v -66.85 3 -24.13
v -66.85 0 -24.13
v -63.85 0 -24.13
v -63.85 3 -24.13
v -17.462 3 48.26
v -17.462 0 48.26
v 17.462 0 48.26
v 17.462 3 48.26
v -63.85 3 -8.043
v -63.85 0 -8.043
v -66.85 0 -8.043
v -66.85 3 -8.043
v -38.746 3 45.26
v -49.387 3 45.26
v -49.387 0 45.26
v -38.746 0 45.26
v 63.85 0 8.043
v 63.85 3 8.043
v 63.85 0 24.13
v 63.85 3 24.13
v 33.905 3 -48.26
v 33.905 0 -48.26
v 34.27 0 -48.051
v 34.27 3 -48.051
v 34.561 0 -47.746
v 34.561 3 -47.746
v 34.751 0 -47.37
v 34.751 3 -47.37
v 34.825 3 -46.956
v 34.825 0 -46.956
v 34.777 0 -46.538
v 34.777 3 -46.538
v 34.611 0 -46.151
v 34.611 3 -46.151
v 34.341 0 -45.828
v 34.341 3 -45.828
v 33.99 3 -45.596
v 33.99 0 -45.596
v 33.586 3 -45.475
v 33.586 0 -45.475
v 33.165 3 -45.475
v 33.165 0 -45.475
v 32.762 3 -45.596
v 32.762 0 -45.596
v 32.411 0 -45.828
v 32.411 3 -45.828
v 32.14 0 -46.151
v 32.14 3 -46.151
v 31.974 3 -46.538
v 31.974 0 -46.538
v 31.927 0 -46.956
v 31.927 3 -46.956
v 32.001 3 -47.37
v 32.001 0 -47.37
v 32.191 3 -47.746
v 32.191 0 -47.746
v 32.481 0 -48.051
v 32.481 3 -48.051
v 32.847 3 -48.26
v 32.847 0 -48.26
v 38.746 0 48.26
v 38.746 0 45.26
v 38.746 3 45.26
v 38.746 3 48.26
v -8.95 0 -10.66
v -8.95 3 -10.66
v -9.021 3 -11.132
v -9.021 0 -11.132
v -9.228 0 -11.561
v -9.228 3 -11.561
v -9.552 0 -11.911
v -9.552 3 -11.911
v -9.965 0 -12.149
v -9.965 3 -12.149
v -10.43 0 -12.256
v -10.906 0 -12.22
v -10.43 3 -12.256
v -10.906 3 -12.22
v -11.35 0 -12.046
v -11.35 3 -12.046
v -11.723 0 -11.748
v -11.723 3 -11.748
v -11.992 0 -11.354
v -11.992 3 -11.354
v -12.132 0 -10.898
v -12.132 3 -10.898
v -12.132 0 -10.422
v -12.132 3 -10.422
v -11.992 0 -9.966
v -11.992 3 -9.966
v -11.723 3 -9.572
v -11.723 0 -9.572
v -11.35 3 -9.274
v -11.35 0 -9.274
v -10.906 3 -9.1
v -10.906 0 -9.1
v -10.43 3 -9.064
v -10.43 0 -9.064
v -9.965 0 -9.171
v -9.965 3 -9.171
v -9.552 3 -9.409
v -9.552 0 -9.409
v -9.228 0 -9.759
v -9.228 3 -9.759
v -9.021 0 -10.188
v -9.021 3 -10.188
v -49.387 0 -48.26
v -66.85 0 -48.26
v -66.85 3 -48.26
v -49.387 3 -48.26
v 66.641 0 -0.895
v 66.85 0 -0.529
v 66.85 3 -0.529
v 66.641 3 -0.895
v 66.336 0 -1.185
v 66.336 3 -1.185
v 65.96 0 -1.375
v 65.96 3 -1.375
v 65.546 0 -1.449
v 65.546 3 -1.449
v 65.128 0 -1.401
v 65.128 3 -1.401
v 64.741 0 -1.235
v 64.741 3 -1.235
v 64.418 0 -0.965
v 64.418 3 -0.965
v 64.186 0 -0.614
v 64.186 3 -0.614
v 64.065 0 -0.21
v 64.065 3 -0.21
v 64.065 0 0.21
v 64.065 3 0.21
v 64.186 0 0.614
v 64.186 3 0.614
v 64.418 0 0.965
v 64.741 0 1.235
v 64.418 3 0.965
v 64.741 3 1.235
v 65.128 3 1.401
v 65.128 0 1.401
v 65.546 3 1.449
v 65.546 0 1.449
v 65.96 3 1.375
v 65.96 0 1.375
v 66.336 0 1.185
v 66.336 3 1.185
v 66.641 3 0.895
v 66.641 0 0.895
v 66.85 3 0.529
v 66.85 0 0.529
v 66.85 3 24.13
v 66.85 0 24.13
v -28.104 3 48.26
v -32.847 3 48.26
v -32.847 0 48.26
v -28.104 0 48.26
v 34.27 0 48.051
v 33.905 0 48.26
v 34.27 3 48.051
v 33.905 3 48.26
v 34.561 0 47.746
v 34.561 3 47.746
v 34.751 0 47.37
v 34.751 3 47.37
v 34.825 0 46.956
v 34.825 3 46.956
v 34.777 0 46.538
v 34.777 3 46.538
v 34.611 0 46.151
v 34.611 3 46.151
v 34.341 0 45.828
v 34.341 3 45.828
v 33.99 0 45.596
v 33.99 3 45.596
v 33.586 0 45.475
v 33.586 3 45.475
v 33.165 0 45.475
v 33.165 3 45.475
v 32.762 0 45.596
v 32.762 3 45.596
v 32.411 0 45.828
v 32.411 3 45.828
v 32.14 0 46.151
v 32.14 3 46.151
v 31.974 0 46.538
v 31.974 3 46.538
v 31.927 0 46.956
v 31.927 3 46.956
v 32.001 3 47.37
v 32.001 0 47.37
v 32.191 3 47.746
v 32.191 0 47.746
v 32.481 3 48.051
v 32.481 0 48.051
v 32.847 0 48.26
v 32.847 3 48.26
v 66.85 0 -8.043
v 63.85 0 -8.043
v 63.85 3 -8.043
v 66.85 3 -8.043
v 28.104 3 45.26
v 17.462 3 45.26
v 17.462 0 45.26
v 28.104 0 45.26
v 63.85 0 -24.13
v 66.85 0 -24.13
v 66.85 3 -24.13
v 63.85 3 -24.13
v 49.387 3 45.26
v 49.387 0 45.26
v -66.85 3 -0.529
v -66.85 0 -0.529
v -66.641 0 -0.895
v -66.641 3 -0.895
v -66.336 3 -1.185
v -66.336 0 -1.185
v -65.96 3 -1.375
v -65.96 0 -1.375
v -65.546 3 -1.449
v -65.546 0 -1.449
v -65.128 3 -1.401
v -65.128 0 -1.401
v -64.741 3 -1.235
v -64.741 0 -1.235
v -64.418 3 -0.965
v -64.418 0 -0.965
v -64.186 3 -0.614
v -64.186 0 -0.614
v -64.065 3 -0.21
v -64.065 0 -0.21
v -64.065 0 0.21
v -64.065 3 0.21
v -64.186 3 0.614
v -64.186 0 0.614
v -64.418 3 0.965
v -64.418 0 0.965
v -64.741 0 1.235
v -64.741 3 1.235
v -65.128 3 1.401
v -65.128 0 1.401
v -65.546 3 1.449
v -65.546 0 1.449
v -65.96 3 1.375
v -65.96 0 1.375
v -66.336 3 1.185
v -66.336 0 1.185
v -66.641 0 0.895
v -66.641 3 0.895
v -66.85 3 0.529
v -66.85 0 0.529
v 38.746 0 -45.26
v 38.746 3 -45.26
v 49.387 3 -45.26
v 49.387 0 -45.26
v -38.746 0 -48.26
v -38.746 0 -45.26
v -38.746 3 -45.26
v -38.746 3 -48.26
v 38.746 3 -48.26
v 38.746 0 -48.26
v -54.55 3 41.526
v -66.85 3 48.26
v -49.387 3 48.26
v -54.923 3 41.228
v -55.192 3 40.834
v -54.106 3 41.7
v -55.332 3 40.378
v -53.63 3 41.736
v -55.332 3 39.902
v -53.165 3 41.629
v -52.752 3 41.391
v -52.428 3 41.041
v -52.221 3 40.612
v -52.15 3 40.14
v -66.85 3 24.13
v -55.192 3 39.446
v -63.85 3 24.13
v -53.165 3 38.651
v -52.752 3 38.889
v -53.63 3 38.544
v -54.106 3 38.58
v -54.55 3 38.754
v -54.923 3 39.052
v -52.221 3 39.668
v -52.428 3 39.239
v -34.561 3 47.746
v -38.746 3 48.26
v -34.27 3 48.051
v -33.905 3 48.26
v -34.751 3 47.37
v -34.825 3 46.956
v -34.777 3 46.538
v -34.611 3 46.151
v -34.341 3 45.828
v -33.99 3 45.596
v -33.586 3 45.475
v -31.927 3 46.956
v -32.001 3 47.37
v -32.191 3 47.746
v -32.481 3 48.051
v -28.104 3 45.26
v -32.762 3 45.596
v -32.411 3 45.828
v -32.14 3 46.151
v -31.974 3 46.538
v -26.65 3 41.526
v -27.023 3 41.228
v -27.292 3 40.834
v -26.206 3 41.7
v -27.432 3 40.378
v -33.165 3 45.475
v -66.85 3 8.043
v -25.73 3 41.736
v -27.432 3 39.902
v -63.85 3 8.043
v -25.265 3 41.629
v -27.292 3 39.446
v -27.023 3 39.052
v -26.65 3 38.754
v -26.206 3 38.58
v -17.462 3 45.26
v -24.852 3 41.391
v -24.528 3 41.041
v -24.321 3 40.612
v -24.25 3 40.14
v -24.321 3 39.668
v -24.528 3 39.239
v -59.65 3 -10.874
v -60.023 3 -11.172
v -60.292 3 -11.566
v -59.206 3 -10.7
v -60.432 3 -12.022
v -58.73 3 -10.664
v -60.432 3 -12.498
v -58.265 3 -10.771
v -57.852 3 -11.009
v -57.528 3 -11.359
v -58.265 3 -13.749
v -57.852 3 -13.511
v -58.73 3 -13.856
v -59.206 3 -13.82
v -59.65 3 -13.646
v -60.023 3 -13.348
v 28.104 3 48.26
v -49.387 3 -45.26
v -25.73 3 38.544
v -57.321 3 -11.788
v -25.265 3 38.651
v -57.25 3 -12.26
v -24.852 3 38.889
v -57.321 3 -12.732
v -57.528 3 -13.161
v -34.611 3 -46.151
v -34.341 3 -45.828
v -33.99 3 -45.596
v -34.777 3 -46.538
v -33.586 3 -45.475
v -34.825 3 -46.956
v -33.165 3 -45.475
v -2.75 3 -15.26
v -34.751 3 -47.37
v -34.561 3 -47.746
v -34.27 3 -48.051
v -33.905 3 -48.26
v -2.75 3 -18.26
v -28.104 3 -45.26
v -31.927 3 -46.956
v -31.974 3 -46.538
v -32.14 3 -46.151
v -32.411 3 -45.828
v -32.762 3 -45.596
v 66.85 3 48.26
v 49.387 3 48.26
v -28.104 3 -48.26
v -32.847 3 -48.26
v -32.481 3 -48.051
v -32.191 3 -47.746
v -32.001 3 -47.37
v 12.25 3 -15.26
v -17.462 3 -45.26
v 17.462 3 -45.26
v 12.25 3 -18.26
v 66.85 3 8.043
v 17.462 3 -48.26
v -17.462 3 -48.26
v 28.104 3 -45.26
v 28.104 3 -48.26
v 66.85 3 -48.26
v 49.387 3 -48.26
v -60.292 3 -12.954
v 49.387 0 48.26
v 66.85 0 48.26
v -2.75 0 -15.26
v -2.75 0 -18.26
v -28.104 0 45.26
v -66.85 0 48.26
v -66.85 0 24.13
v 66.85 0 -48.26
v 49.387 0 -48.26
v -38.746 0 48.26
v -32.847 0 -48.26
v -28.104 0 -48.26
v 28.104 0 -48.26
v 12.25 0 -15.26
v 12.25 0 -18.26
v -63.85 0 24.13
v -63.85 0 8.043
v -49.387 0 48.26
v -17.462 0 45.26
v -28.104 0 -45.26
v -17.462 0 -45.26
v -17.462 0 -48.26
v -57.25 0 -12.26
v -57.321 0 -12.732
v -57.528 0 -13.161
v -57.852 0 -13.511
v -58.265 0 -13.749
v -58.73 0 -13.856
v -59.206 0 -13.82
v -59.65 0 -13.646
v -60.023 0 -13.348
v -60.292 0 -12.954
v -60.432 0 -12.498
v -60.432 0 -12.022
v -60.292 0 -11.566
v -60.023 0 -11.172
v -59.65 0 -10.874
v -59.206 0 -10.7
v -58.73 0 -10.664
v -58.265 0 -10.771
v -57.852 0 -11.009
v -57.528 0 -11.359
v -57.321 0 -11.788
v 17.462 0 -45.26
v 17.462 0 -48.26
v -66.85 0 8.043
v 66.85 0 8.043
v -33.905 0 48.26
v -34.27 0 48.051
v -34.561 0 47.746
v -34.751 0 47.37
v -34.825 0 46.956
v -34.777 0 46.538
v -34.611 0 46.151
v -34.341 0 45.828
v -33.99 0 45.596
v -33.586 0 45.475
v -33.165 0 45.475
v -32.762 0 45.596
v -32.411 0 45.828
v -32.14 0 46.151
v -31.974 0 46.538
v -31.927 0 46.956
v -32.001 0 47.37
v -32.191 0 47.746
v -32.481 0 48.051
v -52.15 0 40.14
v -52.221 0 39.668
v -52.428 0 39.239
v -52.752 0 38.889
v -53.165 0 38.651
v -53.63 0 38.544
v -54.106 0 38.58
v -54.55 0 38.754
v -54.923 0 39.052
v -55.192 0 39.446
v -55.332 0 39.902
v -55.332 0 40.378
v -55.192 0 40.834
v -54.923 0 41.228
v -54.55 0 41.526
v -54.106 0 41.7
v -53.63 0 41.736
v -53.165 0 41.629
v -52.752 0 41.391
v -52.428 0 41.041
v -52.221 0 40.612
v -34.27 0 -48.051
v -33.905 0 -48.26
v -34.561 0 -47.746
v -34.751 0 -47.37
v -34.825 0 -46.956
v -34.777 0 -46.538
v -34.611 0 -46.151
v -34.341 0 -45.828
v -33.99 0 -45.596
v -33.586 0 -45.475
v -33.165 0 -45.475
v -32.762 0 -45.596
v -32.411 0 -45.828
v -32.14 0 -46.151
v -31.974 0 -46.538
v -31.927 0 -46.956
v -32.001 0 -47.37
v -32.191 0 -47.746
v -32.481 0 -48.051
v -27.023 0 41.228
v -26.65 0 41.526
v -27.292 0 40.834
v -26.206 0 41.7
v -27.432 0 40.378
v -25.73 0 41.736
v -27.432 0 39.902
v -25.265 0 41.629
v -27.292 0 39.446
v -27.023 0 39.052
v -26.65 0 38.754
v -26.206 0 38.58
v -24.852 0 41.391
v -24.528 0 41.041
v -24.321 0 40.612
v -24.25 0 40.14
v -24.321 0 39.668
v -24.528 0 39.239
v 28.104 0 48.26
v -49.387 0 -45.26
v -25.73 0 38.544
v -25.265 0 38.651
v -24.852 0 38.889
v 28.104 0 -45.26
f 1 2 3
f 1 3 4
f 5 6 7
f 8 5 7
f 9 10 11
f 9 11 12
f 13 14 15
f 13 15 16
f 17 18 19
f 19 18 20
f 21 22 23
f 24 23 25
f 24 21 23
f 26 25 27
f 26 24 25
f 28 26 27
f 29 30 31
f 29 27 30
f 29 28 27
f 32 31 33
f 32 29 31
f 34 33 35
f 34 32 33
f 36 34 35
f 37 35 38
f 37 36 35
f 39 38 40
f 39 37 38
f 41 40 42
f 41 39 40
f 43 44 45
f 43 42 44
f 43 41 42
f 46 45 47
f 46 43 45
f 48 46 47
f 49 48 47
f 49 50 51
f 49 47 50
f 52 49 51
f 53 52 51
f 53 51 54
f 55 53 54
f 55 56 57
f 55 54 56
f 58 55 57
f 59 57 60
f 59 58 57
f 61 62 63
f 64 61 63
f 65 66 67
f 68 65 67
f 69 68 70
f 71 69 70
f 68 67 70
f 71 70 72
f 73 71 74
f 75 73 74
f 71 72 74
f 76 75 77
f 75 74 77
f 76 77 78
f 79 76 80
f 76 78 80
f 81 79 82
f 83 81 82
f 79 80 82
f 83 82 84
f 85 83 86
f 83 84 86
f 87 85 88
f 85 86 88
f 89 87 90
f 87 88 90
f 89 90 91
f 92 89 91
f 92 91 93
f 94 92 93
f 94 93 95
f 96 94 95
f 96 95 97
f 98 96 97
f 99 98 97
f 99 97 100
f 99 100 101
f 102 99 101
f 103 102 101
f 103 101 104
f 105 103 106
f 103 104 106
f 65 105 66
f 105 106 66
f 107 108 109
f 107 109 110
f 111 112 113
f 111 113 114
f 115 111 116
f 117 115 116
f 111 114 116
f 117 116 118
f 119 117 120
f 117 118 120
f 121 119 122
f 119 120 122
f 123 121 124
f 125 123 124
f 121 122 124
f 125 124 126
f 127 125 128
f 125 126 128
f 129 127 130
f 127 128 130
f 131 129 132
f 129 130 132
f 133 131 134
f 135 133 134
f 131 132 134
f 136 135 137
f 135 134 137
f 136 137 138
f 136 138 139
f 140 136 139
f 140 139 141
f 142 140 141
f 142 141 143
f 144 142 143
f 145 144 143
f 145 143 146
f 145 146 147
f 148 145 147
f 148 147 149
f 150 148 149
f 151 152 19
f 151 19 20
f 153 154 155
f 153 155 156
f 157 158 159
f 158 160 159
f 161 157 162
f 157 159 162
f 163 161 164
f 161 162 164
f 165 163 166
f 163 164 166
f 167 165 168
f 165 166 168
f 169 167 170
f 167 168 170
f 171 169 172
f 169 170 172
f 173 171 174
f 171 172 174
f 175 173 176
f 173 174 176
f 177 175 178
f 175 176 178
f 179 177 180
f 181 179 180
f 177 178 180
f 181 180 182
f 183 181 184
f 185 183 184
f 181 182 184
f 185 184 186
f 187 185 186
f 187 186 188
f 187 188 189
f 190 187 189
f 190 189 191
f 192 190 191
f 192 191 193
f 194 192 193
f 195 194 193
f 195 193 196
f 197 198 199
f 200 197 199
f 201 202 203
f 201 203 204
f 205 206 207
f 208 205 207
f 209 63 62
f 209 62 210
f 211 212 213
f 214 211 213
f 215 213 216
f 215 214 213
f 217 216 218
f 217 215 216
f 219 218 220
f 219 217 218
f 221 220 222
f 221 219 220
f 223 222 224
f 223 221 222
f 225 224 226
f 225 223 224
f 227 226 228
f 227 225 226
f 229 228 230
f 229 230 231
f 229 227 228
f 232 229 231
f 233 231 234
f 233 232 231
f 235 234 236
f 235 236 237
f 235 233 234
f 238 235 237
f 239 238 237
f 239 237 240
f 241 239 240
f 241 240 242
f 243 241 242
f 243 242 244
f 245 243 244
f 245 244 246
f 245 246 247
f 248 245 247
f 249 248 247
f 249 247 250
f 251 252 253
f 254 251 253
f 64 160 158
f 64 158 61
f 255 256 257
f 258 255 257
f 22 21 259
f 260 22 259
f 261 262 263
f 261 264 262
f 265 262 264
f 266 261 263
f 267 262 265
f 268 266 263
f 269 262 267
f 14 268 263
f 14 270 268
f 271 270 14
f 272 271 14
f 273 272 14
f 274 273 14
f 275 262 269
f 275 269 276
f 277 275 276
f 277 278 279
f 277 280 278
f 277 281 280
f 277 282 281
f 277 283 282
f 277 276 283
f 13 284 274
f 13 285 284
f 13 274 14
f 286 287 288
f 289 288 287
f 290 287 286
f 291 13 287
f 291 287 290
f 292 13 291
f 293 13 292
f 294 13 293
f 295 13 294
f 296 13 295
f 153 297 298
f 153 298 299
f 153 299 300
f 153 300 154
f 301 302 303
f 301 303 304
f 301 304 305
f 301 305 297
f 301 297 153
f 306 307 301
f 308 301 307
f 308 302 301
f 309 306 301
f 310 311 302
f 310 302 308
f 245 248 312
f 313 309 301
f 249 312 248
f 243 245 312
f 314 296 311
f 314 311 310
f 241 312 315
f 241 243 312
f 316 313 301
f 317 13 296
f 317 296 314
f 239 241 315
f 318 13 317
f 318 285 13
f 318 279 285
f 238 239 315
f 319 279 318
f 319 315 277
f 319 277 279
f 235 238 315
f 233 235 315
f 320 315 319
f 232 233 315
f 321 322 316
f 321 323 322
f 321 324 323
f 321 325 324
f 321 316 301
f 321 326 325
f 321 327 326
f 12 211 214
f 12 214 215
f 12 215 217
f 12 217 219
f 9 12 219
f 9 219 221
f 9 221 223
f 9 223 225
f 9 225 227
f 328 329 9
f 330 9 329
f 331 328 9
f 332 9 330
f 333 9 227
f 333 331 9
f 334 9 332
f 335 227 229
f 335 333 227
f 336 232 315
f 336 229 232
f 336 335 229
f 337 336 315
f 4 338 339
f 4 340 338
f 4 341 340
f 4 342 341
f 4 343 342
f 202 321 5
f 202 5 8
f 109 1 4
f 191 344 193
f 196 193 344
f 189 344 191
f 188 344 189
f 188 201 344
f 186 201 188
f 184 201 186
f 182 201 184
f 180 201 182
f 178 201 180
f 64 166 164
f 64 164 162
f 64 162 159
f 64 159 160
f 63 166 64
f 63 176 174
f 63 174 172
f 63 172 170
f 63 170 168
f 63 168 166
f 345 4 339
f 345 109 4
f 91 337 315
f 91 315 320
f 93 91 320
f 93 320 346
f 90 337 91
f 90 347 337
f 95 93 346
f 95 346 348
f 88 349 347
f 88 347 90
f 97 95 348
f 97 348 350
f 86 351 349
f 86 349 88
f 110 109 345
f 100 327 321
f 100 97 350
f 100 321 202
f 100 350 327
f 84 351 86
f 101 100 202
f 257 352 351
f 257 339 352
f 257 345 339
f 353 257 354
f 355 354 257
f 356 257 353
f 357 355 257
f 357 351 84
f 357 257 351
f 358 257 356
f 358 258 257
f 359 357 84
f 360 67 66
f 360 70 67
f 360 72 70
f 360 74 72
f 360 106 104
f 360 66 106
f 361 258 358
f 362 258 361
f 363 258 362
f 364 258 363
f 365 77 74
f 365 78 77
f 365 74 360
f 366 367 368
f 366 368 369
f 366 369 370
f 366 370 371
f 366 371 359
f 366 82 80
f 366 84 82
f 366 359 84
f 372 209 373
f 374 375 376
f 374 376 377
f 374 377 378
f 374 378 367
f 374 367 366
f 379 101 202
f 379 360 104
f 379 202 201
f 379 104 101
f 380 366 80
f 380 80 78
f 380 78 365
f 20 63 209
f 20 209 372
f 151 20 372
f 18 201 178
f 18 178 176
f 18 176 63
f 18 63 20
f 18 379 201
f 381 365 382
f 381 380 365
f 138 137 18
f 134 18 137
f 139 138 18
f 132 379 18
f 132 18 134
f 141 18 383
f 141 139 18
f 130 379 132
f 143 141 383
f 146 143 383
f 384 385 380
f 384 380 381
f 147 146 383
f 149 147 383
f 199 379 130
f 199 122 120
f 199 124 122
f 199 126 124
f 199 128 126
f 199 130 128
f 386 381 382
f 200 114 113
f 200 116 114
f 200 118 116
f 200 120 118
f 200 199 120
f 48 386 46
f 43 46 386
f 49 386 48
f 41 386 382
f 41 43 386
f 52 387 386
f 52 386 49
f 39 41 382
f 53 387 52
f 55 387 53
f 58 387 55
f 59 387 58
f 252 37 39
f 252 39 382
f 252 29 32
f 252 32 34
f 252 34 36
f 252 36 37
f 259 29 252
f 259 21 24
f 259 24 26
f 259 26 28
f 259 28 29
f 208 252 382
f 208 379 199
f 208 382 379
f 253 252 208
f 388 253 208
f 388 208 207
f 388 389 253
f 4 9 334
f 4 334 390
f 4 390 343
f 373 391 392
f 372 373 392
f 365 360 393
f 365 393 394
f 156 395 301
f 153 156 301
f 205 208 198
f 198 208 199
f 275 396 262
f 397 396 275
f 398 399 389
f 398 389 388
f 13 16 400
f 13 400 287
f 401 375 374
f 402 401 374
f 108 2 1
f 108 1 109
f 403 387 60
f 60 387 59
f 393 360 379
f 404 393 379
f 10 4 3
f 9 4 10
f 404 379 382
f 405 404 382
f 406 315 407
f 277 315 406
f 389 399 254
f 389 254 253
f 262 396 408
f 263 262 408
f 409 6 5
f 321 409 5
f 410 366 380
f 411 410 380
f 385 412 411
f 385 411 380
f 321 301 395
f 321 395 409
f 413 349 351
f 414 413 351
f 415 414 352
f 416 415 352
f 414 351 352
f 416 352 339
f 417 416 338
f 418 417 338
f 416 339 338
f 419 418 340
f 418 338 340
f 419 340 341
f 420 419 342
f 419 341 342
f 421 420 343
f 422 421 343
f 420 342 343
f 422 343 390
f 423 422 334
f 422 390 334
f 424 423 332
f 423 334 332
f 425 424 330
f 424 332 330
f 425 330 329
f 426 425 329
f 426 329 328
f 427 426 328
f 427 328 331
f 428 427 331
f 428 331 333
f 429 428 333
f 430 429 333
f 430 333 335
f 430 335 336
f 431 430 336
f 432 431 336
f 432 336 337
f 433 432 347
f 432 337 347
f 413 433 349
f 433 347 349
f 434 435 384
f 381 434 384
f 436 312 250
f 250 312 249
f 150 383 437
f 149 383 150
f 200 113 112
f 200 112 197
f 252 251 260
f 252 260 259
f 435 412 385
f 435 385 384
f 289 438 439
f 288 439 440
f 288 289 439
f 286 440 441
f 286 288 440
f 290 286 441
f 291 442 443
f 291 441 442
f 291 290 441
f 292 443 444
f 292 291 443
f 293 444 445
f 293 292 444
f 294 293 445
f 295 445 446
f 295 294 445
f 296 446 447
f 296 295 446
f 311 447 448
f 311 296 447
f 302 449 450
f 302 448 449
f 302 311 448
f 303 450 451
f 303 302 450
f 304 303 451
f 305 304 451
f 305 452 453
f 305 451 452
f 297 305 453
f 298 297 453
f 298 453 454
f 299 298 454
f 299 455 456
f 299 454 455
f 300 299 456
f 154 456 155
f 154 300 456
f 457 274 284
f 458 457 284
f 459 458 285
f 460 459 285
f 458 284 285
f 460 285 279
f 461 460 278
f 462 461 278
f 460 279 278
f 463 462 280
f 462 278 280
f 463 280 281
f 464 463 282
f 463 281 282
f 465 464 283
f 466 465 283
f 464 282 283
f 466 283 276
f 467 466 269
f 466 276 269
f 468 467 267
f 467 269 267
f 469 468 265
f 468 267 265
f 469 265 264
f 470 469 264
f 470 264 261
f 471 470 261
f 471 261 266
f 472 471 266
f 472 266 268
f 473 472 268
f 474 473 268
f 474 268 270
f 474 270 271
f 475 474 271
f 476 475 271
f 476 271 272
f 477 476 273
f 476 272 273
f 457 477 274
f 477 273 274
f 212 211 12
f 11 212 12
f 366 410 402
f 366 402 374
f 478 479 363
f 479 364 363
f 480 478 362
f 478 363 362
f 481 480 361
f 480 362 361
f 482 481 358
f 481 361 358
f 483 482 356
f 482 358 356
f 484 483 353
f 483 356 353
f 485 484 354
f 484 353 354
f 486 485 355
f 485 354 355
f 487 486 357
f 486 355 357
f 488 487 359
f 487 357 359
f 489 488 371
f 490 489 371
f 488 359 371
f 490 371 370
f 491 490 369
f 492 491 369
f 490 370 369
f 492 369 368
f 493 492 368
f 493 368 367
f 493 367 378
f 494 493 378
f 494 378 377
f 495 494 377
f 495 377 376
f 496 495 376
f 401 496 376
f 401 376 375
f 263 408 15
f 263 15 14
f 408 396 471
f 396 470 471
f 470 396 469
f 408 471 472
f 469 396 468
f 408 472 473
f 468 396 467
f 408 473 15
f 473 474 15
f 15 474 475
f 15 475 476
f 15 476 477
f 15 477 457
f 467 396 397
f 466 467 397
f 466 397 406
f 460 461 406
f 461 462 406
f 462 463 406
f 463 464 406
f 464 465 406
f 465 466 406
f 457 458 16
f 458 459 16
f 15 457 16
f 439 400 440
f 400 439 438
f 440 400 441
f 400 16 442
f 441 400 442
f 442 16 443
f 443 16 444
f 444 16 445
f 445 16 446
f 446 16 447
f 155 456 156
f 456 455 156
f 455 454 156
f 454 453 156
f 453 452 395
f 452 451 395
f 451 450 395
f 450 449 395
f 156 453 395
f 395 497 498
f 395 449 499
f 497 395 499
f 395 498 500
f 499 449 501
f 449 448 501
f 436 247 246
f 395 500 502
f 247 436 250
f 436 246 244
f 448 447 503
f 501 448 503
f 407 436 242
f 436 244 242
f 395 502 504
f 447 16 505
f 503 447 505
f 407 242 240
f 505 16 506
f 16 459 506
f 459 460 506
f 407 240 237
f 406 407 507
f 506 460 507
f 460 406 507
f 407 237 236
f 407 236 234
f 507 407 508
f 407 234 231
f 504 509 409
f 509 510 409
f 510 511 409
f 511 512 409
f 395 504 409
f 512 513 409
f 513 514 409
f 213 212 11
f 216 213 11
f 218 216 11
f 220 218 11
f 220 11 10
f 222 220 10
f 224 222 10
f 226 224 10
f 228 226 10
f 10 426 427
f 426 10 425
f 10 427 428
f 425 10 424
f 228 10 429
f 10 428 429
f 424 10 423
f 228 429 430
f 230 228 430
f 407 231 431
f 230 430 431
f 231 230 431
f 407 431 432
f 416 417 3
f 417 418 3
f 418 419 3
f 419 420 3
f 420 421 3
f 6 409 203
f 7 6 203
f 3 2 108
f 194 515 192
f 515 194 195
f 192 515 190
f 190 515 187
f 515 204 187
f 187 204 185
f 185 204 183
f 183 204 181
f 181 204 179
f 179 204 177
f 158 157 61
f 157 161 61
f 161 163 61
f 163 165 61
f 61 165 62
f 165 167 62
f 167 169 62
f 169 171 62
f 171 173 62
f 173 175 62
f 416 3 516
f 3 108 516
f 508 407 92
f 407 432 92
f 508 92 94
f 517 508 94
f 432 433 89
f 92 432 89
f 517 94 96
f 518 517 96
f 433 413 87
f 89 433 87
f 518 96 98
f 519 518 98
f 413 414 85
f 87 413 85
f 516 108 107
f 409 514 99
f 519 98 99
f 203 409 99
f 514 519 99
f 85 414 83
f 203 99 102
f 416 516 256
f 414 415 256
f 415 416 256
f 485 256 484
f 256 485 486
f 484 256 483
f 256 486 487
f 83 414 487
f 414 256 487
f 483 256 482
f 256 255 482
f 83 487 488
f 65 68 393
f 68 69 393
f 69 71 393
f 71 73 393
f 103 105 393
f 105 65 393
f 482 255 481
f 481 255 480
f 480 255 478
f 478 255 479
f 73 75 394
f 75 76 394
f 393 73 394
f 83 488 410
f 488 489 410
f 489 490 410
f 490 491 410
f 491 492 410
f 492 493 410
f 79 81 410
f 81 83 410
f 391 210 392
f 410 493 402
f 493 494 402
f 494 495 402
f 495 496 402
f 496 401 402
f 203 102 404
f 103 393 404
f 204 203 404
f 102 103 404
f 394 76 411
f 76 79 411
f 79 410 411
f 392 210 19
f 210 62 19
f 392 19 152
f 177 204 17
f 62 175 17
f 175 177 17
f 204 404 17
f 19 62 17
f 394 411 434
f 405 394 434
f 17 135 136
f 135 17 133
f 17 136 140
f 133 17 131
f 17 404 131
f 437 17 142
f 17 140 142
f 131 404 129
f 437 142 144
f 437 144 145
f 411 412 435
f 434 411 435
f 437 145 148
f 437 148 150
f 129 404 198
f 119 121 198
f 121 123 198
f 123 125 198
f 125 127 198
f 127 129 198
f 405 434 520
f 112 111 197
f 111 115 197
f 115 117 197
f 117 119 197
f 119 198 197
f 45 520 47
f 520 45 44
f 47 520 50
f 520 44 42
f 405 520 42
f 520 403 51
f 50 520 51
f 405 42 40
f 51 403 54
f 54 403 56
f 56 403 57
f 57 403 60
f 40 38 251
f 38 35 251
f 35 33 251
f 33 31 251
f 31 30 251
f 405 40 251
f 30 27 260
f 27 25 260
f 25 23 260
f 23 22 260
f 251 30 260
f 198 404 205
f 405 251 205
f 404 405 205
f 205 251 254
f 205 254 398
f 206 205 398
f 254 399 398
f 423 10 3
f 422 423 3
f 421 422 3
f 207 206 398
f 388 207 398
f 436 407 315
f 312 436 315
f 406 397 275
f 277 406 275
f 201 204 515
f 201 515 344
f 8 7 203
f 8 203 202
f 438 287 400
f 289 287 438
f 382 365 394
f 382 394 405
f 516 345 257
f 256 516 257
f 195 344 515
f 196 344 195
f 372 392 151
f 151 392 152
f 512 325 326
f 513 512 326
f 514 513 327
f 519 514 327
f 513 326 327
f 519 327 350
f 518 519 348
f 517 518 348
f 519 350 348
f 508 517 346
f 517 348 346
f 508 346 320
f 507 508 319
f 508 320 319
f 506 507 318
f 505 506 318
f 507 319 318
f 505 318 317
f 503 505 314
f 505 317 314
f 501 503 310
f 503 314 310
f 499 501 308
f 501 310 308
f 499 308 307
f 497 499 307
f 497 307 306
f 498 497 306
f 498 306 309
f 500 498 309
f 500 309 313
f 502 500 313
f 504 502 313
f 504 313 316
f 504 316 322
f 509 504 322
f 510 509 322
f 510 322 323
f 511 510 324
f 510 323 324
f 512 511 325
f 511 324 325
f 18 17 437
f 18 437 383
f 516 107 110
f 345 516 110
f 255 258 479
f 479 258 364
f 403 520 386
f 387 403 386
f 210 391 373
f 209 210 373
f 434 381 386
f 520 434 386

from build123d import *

# Parameters (mm, degrees)
SKETCH1_W                = 133.7
SKETCH1_H                = 96.52
BOSS_EXTRUDE2_DEPTH      = 3
SKETCH6_W                = 48.26
SKETCH6_H                = 3
CUT_EXTRUDE2_DEPTH       = 3
SKETCH9_W                = 16.086666666
SKETCH9_H                = 3
BOSS_EXTRUDE4_DEPTH      = 3
SKETCH11_W               = 31.925
SKETCH11_H               = 3
CUT_EXTRUDE8_DEPTH       = 3
SKETCH15_W               = 10.641666666
SKETCH15_H               = 3
BOSS_EXTRUDE7_DEPTH      = 3
SKETCH18_W               = 31.925
SKETCH18_H               = 3
CUT_EXTRUDE10_DEPTH      = 3
SKETCH19_W               = 10.64166667
SKETCH19_H               = 3
BOSS_EXTRUDE8_DEPTH      = 3
SKETCH21_R               = 1.45
CUT_EXTRUDE11_DEPTH      = 3
MIRROR16_COPY_1_SKETCH_R = 1.45
MIRROR16_COPY_1_DEPTH    = 3
SKETCH22_R               = 1.45
CUT_EXTRUDE19_DEPTH      = 3
SKETCH24_R               = 1.6
CUT_EXTRUDE20_DEPTH      = 3
SKETCH25_W               = 15
SKETCH25_H               = 3
CUT_EXTRUDE21_DEPTH      = 3


with BuildPart() as part:
    # Sketch1 → Boss-Extrude2 (new body)
    with BuildSketch(Plane(origin=(0, 0, 0), x_dir=(1, 0, 0), z_dir=(0, 1, 0))):
        Rectangle(SKETCH1_W, SKETCH1_H)
    extrude(amount=BOSS_EXTRUDE2_DEPTH)

    # Sketch6 → Cut-Extrude2 (cut)
    with BuildSketch(Plane.ZY.offset(66.85)):
        with Locations((0, 1.5)):
            Rectangle(SKETCH6_W, SKETCH6_H)
    cut_extrude2 = extrude(amount=-CUT_EXTRUDE2_DEPTH, mode=Mode.SUBTRACT)

    # Mirror3: Cut-Extrude2 across plane
    add(cut_extrude2.mirror(Plane(origin=(0, 0, 0), x_dir=(0, 0, 1), z_dir=(1, 0, 0))), mode=Mode.SUBTRACT)

    # Sketch9 → Boss-Extrude4 (add)
    with BuildSketch(Plane(origin=(63.85, 0, 0), x_dir=(0, 0, -1), z_dir=(1, 0, 0))):
        with Locations((0, 1.5)):
            Rectangle(SKETCH9_W, SKETCH9_H)
    boss_extrude4 = extrude(amount=BOSS_EXTRUDE4_DEPTH)

    # Mirror5: Boss-Extrude4 across plane
    add(boss_extrude4.mirror(Plane(origin=(0, 0, 0), x_dir=(0, 0, 1), z_dir=(1, 0, 0))))

    # Sketch11 → Cut-Extrude8 (cut)
    with BuildSketch(Plane.XY.offset(48.26)):
        with Locations((-33.425, 1.5)):
            Rectangle(SKETCH11_W, SKETCH11_H)
    cut_extrude8 = extrude(amount=-CUT_EXTRUDE8_DEPTH, mode=Mode.SUBTRACT)

    # Sketch15 → Boss-Extrude7 (add)
    with BuildSketch(Plane.XY.offset(45.26)):
        with Locations((-33.425, 1.5)):
            Rectangle(SKETCH15_W, SKETCH15_H)
    boss_extrude7 = extrude(amount=BOSS_EXTRUDE7_DEPTH)

    # Mirror11: Cut-Extrude8 across plane
    add(cut_extrude8.mirror(Plane.XY), mode=Mode.SUBTRACT)

    # Mirror12: Boss-Extrude7 across plane
    add(boss_extrude7.mirror(Plane.XY))

    # Sketch18 → Cut-Extrude10 (cut)
    with BuildSketch(Plane.XY.offset(48.26)):
        with Locations((33.425, 1.5)):
            Rectangle(SKETCH18_W, SKETCH18_H)
    cut_extrude10 = extrude(amount=-CUT_EXTRUDE10_DEPTH, mode=Mode.SUBTRACT)

    # Sketch19 → Boss-Extrude8 (add)
    with BuildSketch(Plane.XY.offset(45.26)):
        with Locations((33.425, 1.5)):
            Rectangle(SKETCH19_W, SKETCH19_H)
    boss_extrude8 = extrude(amount=BOSS_EXTRUDE8_DEPTH)

    # Mirror13: Cut-Extrude10 across plane
    add(cut_extrude10.mirror(Plane.XY), mode=Mode.SUBTRACT)

    # Mirror14: Boss-Extrude8 across plane
    add(boss_extrude8.mirror(Plane.XY))

    # Sketch21 → Cut-Extrude11 (cut)
    with BuildSketch(Plane(origin=(0, 3, 0), x_dir=(1, 0, 0), z_dir=(0, 1, 0))):
        with Locations((33.375833335, -46.91)):
            Circle(SKETCH21_R)
    cut_extrude11 = extrude(amount=-CUT_EXTRUDE11_DEPTH, mode=Mode.SUBTRACT)

    # Mirror15: Cut-Extrude11 across plane
    add(cut_extrude11.mirror(Plane.XY), mode=Mode.SUBTRACT)

    # Mirror16: Cut-Extrude11 across plane
    add(cut_extrude11.mirror(Plane(origin=(0, 0, 0), x_dir=(0, 0, 1), z_dir=(1, 0, 0))), mode=Mode.SUBTRACT)

    # Mirror16 copy 1 sketch → Mirror16 copy 1 (cut)
    with BuildSketch(Plane(origin=(0, 3, 0), x_dir=(-1, 0, 0), z_dir=(0, 1, 0))):
        with Locations((33.375833335, -46.91)):
            Circle(MIRROR16_COPY_1_SKETCH_R)
    extrude(amount=-MIRROR16_COPY_1_DEPTH, mode=Mode.SUBTRACT)

    # Sketch22 → Cut-Extrude19 (cut)
    with BuildSketch(Plane(origin=(0, 3, 0), x_dir=(1, 0, 0), z_dir=(0, 1, 0))):
        with Locations((65.5, 0)):
            Circle(SKETCH22_R)
    cut_extrude19 = extrude(amount=-CUT_EXTRUDE19_DEPTH, mode=Mode.SUBTRACT)

    # Mirror17: Cut-Extrude19 across plane
    add(cut_extrude19.mirror(Plane(origin=(0, 0, 0), x_dir=(0, 0, 1), z_dir=(1, 0, 0))), mode=Mode.SUBTRACT)

    # Sketch24 → Cut-Extrude20 (cut)
    with BuildSketch(Plane(origin=(0, 3, 0), x_dir=(1, 0, 0), z_dir=(0, 1, 0))):
        with Locations((-53.75, -40.14)):
            Circle(SKETCH24_R)
        with Locations((-25.85, -40.14)):
            Circle(SKETCH24_R)
        with Locations((-10.55, 10.66)):
            Circle(SKETCH24_R)
        with Locations((-58.85, 12.26)):
            Circle(SKETCH24_R)
    extrude(amount=-CUT_EXTRUDE20_DEPTH, mode=Mode.SUBTRACT)

    # Sketch25 → Cut-Extrude21 (cut)
    with BuildSketch(Plane(origin=(0, 3, 0), x_dir=(1, 0, 0), z_dir=(0, 1, 0))):
        with Locations((4.75, 16.76)):
            Rectangle(SKETCH25_W, SKETCH25_H)
    extrude(amount=-CUT_EXTRUDE21_DEPTH, mode=Mode.SUBTRACT)


solid = part.part
